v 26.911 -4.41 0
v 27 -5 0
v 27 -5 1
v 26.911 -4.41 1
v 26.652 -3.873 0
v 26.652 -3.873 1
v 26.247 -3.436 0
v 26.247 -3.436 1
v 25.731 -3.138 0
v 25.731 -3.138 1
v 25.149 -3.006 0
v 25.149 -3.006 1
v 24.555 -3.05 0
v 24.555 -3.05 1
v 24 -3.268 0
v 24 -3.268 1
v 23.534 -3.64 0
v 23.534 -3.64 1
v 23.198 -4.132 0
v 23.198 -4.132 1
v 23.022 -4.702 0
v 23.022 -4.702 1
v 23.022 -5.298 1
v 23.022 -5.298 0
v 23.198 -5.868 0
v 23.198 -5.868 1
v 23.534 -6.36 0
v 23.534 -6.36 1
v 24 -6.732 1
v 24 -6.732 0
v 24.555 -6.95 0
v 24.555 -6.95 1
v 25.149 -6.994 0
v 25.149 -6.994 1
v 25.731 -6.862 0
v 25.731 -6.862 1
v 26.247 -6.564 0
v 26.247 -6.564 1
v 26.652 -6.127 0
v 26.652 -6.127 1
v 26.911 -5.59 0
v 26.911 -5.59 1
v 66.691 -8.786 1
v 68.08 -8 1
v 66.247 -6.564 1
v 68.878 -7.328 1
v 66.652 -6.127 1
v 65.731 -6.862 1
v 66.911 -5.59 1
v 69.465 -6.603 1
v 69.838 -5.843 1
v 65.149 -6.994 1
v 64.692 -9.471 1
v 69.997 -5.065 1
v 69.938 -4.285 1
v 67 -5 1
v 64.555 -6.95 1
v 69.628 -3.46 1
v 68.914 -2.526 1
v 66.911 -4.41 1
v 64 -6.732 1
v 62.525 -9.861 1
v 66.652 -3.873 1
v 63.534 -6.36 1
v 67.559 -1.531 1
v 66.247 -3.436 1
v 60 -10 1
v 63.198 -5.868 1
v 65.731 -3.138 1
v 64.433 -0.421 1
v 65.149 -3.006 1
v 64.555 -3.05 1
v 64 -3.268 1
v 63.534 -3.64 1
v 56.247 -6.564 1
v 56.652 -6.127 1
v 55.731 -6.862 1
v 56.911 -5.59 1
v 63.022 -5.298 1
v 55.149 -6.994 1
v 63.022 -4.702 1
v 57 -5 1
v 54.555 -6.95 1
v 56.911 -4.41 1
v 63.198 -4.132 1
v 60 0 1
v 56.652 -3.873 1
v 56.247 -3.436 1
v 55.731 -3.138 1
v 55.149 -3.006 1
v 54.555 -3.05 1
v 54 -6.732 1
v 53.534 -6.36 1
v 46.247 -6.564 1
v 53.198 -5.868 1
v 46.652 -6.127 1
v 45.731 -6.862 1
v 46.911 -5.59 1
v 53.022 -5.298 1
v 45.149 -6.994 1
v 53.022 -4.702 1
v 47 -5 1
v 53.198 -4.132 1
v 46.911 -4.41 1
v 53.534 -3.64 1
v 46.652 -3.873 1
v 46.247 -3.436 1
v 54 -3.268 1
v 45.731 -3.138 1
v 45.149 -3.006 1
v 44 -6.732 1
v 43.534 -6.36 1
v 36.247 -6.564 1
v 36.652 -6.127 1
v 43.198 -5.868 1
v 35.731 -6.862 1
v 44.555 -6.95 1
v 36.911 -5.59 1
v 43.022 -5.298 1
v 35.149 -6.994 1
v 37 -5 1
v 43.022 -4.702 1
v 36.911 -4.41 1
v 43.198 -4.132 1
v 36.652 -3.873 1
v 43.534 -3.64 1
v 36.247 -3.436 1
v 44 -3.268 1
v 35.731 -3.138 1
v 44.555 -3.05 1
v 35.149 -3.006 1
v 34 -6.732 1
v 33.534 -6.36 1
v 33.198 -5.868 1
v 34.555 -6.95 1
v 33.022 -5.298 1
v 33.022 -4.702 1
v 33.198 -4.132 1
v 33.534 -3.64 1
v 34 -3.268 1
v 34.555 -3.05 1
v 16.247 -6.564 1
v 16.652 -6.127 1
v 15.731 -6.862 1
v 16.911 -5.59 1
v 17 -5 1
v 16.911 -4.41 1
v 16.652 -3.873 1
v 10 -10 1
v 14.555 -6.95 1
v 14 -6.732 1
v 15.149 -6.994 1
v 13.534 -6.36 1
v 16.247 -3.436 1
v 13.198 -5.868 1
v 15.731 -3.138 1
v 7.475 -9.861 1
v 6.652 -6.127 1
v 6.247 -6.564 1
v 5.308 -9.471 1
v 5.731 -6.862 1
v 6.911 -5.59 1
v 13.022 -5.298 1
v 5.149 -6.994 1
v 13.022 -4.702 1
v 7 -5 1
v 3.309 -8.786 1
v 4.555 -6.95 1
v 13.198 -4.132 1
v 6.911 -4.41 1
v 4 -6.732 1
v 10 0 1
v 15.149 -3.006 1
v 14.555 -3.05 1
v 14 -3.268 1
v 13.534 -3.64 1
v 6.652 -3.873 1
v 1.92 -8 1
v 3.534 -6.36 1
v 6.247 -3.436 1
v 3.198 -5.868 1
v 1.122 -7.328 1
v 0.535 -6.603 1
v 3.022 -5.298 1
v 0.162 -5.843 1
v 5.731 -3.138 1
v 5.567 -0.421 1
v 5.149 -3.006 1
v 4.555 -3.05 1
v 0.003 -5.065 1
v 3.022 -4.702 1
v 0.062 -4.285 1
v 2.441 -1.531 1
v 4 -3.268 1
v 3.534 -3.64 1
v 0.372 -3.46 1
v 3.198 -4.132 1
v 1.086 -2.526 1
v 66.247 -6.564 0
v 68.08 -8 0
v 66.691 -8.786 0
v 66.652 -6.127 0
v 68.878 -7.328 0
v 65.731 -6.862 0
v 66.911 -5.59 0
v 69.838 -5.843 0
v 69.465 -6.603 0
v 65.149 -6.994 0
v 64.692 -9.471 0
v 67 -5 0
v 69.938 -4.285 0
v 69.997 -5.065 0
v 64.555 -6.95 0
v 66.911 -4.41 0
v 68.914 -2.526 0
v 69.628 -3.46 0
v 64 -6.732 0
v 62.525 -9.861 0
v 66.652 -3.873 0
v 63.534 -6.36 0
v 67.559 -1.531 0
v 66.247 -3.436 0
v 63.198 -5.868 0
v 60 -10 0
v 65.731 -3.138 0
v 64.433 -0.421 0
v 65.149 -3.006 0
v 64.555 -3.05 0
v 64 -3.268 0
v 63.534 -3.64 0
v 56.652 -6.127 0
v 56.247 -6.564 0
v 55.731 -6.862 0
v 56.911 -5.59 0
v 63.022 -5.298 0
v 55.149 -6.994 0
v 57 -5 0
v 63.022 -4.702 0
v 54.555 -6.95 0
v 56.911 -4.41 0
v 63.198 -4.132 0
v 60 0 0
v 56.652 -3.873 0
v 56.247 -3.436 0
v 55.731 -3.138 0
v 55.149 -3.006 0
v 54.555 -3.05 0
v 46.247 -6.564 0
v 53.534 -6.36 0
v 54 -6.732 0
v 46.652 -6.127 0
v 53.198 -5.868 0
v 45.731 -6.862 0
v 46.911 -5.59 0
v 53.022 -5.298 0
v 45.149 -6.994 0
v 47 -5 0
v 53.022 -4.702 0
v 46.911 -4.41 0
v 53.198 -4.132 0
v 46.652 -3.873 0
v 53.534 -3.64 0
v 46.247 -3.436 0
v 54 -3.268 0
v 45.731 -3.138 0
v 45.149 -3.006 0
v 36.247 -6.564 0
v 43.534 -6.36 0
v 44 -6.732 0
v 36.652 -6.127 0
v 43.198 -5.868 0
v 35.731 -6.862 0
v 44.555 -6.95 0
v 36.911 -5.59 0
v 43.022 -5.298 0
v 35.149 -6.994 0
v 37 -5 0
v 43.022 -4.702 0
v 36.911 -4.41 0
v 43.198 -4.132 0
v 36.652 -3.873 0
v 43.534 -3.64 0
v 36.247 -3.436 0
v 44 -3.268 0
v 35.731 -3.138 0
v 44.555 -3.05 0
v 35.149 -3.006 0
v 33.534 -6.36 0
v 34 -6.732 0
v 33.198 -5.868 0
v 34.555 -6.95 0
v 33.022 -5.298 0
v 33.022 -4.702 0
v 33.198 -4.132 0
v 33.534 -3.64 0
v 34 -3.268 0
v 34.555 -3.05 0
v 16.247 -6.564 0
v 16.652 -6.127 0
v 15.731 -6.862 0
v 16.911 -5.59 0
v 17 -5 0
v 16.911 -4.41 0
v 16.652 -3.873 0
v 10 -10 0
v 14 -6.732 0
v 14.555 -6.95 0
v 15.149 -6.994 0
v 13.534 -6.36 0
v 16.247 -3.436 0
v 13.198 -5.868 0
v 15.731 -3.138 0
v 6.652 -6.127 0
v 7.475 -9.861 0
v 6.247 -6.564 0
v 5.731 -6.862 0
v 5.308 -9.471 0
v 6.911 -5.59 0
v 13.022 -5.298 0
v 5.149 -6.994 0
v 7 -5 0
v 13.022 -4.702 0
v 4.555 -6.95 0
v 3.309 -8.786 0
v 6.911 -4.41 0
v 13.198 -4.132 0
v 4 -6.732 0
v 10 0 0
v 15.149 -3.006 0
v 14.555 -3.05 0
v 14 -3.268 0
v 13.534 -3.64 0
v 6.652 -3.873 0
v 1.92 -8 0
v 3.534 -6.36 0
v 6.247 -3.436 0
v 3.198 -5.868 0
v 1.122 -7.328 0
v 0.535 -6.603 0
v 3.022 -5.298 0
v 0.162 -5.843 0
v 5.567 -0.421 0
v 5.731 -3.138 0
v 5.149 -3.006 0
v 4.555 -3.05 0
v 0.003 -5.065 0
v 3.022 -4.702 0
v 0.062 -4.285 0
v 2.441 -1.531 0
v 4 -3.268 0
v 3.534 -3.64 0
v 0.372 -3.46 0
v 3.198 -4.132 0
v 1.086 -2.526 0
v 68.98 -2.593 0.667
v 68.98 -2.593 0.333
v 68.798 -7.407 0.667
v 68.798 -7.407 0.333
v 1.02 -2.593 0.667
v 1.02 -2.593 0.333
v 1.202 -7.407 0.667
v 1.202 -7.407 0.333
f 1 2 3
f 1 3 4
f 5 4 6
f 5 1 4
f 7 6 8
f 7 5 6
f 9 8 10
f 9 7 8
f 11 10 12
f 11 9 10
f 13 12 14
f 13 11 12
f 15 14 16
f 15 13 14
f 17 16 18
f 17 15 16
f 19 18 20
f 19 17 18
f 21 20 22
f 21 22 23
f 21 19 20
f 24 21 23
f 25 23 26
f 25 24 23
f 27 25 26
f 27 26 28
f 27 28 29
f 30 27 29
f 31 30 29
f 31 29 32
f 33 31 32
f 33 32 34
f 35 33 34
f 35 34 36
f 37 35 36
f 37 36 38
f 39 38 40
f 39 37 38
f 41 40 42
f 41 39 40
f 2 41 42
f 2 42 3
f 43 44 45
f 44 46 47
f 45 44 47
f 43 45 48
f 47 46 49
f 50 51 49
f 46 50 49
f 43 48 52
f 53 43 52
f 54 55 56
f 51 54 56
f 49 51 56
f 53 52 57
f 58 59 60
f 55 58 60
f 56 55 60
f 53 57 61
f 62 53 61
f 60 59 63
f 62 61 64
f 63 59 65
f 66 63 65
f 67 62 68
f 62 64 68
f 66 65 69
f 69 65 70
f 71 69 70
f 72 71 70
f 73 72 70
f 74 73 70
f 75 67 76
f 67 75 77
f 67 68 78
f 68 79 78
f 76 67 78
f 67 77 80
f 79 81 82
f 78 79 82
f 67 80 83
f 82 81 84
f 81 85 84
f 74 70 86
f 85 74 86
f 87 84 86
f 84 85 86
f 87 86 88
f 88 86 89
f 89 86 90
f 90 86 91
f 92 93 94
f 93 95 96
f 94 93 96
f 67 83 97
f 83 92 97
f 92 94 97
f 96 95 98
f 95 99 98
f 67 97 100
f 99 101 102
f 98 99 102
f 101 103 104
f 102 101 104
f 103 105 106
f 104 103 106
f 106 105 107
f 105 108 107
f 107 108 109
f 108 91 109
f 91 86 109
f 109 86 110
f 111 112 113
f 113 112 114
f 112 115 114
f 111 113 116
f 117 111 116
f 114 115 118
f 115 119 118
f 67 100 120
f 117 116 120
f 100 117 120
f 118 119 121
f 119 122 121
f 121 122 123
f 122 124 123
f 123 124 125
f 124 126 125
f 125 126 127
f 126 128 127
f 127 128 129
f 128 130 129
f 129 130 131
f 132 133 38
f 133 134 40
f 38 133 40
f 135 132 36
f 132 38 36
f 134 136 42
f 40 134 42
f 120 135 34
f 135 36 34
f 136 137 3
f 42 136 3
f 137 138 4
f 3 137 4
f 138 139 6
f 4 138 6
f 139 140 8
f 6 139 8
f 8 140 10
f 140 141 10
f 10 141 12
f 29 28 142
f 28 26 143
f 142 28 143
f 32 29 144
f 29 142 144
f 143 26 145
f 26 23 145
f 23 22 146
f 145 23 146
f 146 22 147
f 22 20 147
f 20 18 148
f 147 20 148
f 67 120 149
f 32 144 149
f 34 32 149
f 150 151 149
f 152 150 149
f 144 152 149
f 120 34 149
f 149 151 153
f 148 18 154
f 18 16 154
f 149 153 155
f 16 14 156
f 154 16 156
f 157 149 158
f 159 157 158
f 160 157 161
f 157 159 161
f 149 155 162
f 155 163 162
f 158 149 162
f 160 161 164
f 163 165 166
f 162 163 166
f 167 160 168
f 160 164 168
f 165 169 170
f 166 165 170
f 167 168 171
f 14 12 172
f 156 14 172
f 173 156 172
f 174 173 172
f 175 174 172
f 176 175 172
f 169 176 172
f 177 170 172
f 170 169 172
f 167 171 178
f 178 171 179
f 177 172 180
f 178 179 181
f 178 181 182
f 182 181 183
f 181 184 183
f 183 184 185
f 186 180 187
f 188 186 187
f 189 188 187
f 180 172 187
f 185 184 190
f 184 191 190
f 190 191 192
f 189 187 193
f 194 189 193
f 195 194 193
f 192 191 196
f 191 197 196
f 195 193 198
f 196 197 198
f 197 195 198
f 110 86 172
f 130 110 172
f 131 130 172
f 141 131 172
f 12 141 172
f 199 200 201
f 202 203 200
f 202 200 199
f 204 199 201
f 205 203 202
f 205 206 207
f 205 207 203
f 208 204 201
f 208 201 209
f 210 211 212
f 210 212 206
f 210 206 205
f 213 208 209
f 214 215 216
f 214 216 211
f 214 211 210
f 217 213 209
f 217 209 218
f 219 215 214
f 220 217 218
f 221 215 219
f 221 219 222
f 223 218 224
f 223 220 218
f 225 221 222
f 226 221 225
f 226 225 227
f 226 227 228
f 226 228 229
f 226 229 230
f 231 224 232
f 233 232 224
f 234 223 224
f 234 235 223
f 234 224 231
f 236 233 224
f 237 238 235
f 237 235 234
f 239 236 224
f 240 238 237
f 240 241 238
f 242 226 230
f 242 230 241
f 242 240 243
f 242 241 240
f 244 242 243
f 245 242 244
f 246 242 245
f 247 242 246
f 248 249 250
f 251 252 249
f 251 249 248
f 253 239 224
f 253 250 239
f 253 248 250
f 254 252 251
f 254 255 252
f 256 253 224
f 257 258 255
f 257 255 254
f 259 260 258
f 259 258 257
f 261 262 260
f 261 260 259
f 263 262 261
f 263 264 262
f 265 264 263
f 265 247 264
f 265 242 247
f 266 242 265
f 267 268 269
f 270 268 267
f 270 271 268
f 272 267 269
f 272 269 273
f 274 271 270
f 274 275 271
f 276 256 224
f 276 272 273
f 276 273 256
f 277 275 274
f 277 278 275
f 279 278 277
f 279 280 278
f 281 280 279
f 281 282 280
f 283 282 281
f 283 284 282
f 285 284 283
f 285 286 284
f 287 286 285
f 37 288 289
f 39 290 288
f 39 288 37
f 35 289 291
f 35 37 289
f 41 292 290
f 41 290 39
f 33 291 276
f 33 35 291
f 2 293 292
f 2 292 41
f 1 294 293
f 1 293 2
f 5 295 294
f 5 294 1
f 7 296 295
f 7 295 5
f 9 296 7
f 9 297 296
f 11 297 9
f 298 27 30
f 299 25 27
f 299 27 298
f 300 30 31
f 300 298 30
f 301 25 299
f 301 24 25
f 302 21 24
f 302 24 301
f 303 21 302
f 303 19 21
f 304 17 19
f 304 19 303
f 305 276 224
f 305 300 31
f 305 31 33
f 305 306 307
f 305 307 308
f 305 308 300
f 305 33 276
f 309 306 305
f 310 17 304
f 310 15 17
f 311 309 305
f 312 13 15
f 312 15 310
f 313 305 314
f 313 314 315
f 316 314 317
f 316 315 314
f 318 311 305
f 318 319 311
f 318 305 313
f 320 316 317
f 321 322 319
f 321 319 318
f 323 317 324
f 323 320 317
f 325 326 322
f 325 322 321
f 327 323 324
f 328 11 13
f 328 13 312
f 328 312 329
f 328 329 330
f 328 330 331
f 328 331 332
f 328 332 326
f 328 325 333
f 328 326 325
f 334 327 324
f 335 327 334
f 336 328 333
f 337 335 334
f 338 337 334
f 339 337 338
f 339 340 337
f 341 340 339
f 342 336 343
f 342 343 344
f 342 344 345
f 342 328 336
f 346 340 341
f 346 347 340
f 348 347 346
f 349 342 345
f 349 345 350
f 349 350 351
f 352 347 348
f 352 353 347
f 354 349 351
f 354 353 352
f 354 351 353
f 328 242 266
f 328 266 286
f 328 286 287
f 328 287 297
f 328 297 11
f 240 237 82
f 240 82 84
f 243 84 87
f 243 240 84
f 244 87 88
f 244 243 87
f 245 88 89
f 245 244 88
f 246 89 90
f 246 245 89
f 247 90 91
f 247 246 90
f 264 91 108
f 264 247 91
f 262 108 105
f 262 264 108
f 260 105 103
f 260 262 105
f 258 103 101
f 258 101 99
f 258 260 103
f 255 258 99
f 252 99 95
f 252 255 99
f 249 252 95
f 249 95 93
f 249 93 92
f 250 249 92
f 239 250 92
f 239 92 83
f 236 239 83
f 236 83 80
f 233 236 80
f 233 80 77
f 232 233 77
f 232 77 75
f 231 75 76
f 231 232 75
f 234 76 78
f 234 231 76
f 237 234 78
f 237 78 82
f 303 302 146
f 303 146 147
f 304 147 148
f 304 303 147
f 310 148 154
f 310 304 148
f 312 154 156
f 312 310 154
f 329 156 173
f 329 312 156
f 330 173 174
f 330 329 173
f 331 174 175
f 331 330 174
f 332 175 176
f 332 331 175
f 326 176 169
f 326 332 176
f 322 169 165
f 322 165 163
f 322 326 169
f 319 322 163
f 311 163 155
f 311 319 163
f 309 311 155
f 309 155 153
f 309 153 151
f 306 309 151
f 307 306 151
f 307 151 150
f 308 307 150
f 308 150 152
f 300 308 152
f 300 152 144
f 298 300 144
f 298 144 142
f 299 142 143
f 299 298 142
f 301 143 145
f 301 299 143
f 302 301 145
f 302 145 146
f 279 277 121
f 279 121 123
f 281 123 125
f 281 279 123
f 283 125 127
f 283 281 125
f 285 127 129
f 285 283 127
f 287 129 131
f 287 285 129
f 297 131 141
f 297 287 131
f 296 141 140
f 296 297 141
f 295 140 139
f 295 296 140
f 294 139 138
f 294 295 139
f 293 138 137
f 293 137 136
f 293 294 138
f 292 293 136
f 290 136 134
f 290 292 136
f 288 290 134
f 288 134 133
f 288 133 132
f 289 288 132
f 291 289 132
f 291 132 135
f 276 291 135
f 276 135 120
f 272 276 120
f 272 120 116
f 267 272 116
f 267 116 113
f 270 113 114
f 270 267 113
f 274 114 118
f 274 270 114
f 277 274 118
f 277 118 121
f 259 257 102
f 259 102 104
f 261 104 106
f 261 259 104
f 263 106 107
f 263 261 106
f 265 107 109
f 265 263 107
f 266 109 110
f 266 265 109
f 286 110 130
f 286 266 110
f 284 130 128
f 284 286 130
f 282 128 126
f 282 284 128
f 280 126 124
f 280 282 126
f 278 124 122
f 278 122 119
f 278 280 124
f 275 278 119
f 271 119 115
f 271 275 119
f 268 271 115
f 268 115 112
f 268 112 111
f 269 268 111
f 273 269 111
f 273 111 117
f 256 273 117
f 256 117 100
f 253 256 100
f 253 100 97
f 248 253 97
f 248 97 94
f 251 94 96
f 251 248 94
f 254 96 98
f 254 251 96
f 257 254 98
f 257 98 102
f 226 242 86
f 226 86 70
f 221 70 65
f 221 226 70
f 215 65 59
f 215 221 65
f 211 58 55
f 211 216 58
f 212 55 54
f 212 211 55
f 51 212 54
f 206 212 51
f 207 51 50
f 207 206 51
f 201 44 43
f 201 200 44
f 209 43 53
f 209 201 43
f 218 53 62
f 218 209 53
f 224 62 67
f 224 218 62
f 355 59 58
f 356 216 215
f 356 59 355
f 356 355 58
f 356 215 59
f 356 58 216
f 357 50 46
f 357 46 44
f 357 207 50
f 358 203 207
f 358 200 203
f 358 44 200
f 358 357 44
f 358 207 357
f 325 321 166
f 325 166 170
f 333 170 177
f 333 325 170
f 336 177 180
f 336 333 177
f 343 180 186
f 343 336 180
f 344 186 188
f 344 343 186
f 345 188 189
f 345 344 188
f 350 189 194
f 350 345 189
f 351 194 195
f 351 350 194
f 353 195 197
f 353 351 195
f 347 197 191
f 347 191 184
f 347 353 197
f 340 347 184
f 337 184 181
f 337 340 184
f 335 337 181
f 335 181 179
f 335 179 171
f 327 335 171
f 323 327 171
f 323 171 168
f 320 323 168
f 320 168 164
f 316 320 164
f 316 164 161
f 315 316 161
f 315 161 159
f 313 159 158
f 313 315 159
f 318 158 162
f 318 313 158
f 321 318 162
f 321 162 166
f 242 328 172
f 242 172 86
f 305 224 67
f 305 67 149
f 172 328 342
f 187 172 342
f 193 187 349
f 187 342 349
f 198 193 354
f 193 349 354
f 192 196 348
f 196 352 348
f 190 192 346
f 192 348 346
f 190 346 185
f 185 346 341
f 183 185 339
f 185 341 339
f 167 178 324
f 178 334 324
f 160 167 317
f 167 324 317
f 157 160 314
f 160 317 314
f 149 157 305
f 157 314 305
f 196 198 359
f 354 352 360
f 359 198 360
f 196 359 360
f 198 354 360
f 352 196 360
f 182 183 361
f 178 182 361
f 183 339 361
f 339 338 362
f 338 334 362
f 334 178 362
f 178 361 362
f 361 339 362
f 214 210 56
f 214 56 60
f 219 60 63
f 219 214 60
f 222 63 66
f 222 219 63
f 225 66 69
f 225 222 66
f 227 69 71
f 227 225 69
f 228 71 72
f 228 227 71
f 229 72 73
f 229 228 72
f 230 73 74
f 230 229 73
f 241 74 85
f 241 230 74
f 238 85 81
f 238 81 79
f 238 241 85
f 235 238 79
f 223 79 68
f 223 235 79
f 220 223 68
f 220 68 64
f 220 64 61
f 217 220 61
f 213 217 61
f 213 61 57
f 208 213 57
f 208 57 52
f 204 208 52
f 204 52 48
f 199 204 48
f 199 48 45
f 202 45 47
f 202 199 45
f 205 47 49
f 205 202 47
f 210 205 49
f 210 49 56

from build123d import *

# Parameters (mm, degrees)
SKETCH_3_R      = 2
EXTRUDE_1_DEPTH = 1


with BuildPart() as part:
    # Эскиз3 → Бобышка-Вытянуть1 (new body)
    with BuildSketch(Plane.XY):
        with BuildLine():
            Line((10, 0), (60, 0))
            add(Edge.make_bspline(
                [(60, 0), (73.743685419, 0), (72.922981248, -10), (60, -10)],
                knots=[0, 0, 0, 0, 1, 1, 1, 1], degree=3))
            Line((60, -10), (10, -10))
            add(Edge.make_bspline(
                [(10, 0), (-3.743685419, 0), (-2.922981248, -10), (10, -10)],
                knots=[0, 0, 0, 0, 1, 1, 1, 1], degree=3))
        make_face()
        with Locations((5, -5)):
            Circle(SKETCH_3_R, mode=Mode.SUBTRACT)
        with Locations((65, -5)):
            Circle(SKETCH_3_R, mode=Mode.SUBTRACT)
        with Locations((15, -5)):
            Circle(SKETCH_3_R, mode=Mode.SUBTRACT)
        with Locations((25, -5)):
            Circle(SKETCH_3_R, mode=Mode.SUBTRACT)
        with Locations((35, -5)):
            Circle(SKETCH_3_R, mode=Mode.SUBTRACT)
        with Locations((45, -5)):
            Circle(SKETCH_3_R, mode=Mode.SUBTRACT)
        with Locations((55, -5)):
            Circle(SKETCH_3_R, mode=Mode.SUBTRACT)
    extrude(amount=EXTRUDE_1_DEPTH)


solid = part.part
